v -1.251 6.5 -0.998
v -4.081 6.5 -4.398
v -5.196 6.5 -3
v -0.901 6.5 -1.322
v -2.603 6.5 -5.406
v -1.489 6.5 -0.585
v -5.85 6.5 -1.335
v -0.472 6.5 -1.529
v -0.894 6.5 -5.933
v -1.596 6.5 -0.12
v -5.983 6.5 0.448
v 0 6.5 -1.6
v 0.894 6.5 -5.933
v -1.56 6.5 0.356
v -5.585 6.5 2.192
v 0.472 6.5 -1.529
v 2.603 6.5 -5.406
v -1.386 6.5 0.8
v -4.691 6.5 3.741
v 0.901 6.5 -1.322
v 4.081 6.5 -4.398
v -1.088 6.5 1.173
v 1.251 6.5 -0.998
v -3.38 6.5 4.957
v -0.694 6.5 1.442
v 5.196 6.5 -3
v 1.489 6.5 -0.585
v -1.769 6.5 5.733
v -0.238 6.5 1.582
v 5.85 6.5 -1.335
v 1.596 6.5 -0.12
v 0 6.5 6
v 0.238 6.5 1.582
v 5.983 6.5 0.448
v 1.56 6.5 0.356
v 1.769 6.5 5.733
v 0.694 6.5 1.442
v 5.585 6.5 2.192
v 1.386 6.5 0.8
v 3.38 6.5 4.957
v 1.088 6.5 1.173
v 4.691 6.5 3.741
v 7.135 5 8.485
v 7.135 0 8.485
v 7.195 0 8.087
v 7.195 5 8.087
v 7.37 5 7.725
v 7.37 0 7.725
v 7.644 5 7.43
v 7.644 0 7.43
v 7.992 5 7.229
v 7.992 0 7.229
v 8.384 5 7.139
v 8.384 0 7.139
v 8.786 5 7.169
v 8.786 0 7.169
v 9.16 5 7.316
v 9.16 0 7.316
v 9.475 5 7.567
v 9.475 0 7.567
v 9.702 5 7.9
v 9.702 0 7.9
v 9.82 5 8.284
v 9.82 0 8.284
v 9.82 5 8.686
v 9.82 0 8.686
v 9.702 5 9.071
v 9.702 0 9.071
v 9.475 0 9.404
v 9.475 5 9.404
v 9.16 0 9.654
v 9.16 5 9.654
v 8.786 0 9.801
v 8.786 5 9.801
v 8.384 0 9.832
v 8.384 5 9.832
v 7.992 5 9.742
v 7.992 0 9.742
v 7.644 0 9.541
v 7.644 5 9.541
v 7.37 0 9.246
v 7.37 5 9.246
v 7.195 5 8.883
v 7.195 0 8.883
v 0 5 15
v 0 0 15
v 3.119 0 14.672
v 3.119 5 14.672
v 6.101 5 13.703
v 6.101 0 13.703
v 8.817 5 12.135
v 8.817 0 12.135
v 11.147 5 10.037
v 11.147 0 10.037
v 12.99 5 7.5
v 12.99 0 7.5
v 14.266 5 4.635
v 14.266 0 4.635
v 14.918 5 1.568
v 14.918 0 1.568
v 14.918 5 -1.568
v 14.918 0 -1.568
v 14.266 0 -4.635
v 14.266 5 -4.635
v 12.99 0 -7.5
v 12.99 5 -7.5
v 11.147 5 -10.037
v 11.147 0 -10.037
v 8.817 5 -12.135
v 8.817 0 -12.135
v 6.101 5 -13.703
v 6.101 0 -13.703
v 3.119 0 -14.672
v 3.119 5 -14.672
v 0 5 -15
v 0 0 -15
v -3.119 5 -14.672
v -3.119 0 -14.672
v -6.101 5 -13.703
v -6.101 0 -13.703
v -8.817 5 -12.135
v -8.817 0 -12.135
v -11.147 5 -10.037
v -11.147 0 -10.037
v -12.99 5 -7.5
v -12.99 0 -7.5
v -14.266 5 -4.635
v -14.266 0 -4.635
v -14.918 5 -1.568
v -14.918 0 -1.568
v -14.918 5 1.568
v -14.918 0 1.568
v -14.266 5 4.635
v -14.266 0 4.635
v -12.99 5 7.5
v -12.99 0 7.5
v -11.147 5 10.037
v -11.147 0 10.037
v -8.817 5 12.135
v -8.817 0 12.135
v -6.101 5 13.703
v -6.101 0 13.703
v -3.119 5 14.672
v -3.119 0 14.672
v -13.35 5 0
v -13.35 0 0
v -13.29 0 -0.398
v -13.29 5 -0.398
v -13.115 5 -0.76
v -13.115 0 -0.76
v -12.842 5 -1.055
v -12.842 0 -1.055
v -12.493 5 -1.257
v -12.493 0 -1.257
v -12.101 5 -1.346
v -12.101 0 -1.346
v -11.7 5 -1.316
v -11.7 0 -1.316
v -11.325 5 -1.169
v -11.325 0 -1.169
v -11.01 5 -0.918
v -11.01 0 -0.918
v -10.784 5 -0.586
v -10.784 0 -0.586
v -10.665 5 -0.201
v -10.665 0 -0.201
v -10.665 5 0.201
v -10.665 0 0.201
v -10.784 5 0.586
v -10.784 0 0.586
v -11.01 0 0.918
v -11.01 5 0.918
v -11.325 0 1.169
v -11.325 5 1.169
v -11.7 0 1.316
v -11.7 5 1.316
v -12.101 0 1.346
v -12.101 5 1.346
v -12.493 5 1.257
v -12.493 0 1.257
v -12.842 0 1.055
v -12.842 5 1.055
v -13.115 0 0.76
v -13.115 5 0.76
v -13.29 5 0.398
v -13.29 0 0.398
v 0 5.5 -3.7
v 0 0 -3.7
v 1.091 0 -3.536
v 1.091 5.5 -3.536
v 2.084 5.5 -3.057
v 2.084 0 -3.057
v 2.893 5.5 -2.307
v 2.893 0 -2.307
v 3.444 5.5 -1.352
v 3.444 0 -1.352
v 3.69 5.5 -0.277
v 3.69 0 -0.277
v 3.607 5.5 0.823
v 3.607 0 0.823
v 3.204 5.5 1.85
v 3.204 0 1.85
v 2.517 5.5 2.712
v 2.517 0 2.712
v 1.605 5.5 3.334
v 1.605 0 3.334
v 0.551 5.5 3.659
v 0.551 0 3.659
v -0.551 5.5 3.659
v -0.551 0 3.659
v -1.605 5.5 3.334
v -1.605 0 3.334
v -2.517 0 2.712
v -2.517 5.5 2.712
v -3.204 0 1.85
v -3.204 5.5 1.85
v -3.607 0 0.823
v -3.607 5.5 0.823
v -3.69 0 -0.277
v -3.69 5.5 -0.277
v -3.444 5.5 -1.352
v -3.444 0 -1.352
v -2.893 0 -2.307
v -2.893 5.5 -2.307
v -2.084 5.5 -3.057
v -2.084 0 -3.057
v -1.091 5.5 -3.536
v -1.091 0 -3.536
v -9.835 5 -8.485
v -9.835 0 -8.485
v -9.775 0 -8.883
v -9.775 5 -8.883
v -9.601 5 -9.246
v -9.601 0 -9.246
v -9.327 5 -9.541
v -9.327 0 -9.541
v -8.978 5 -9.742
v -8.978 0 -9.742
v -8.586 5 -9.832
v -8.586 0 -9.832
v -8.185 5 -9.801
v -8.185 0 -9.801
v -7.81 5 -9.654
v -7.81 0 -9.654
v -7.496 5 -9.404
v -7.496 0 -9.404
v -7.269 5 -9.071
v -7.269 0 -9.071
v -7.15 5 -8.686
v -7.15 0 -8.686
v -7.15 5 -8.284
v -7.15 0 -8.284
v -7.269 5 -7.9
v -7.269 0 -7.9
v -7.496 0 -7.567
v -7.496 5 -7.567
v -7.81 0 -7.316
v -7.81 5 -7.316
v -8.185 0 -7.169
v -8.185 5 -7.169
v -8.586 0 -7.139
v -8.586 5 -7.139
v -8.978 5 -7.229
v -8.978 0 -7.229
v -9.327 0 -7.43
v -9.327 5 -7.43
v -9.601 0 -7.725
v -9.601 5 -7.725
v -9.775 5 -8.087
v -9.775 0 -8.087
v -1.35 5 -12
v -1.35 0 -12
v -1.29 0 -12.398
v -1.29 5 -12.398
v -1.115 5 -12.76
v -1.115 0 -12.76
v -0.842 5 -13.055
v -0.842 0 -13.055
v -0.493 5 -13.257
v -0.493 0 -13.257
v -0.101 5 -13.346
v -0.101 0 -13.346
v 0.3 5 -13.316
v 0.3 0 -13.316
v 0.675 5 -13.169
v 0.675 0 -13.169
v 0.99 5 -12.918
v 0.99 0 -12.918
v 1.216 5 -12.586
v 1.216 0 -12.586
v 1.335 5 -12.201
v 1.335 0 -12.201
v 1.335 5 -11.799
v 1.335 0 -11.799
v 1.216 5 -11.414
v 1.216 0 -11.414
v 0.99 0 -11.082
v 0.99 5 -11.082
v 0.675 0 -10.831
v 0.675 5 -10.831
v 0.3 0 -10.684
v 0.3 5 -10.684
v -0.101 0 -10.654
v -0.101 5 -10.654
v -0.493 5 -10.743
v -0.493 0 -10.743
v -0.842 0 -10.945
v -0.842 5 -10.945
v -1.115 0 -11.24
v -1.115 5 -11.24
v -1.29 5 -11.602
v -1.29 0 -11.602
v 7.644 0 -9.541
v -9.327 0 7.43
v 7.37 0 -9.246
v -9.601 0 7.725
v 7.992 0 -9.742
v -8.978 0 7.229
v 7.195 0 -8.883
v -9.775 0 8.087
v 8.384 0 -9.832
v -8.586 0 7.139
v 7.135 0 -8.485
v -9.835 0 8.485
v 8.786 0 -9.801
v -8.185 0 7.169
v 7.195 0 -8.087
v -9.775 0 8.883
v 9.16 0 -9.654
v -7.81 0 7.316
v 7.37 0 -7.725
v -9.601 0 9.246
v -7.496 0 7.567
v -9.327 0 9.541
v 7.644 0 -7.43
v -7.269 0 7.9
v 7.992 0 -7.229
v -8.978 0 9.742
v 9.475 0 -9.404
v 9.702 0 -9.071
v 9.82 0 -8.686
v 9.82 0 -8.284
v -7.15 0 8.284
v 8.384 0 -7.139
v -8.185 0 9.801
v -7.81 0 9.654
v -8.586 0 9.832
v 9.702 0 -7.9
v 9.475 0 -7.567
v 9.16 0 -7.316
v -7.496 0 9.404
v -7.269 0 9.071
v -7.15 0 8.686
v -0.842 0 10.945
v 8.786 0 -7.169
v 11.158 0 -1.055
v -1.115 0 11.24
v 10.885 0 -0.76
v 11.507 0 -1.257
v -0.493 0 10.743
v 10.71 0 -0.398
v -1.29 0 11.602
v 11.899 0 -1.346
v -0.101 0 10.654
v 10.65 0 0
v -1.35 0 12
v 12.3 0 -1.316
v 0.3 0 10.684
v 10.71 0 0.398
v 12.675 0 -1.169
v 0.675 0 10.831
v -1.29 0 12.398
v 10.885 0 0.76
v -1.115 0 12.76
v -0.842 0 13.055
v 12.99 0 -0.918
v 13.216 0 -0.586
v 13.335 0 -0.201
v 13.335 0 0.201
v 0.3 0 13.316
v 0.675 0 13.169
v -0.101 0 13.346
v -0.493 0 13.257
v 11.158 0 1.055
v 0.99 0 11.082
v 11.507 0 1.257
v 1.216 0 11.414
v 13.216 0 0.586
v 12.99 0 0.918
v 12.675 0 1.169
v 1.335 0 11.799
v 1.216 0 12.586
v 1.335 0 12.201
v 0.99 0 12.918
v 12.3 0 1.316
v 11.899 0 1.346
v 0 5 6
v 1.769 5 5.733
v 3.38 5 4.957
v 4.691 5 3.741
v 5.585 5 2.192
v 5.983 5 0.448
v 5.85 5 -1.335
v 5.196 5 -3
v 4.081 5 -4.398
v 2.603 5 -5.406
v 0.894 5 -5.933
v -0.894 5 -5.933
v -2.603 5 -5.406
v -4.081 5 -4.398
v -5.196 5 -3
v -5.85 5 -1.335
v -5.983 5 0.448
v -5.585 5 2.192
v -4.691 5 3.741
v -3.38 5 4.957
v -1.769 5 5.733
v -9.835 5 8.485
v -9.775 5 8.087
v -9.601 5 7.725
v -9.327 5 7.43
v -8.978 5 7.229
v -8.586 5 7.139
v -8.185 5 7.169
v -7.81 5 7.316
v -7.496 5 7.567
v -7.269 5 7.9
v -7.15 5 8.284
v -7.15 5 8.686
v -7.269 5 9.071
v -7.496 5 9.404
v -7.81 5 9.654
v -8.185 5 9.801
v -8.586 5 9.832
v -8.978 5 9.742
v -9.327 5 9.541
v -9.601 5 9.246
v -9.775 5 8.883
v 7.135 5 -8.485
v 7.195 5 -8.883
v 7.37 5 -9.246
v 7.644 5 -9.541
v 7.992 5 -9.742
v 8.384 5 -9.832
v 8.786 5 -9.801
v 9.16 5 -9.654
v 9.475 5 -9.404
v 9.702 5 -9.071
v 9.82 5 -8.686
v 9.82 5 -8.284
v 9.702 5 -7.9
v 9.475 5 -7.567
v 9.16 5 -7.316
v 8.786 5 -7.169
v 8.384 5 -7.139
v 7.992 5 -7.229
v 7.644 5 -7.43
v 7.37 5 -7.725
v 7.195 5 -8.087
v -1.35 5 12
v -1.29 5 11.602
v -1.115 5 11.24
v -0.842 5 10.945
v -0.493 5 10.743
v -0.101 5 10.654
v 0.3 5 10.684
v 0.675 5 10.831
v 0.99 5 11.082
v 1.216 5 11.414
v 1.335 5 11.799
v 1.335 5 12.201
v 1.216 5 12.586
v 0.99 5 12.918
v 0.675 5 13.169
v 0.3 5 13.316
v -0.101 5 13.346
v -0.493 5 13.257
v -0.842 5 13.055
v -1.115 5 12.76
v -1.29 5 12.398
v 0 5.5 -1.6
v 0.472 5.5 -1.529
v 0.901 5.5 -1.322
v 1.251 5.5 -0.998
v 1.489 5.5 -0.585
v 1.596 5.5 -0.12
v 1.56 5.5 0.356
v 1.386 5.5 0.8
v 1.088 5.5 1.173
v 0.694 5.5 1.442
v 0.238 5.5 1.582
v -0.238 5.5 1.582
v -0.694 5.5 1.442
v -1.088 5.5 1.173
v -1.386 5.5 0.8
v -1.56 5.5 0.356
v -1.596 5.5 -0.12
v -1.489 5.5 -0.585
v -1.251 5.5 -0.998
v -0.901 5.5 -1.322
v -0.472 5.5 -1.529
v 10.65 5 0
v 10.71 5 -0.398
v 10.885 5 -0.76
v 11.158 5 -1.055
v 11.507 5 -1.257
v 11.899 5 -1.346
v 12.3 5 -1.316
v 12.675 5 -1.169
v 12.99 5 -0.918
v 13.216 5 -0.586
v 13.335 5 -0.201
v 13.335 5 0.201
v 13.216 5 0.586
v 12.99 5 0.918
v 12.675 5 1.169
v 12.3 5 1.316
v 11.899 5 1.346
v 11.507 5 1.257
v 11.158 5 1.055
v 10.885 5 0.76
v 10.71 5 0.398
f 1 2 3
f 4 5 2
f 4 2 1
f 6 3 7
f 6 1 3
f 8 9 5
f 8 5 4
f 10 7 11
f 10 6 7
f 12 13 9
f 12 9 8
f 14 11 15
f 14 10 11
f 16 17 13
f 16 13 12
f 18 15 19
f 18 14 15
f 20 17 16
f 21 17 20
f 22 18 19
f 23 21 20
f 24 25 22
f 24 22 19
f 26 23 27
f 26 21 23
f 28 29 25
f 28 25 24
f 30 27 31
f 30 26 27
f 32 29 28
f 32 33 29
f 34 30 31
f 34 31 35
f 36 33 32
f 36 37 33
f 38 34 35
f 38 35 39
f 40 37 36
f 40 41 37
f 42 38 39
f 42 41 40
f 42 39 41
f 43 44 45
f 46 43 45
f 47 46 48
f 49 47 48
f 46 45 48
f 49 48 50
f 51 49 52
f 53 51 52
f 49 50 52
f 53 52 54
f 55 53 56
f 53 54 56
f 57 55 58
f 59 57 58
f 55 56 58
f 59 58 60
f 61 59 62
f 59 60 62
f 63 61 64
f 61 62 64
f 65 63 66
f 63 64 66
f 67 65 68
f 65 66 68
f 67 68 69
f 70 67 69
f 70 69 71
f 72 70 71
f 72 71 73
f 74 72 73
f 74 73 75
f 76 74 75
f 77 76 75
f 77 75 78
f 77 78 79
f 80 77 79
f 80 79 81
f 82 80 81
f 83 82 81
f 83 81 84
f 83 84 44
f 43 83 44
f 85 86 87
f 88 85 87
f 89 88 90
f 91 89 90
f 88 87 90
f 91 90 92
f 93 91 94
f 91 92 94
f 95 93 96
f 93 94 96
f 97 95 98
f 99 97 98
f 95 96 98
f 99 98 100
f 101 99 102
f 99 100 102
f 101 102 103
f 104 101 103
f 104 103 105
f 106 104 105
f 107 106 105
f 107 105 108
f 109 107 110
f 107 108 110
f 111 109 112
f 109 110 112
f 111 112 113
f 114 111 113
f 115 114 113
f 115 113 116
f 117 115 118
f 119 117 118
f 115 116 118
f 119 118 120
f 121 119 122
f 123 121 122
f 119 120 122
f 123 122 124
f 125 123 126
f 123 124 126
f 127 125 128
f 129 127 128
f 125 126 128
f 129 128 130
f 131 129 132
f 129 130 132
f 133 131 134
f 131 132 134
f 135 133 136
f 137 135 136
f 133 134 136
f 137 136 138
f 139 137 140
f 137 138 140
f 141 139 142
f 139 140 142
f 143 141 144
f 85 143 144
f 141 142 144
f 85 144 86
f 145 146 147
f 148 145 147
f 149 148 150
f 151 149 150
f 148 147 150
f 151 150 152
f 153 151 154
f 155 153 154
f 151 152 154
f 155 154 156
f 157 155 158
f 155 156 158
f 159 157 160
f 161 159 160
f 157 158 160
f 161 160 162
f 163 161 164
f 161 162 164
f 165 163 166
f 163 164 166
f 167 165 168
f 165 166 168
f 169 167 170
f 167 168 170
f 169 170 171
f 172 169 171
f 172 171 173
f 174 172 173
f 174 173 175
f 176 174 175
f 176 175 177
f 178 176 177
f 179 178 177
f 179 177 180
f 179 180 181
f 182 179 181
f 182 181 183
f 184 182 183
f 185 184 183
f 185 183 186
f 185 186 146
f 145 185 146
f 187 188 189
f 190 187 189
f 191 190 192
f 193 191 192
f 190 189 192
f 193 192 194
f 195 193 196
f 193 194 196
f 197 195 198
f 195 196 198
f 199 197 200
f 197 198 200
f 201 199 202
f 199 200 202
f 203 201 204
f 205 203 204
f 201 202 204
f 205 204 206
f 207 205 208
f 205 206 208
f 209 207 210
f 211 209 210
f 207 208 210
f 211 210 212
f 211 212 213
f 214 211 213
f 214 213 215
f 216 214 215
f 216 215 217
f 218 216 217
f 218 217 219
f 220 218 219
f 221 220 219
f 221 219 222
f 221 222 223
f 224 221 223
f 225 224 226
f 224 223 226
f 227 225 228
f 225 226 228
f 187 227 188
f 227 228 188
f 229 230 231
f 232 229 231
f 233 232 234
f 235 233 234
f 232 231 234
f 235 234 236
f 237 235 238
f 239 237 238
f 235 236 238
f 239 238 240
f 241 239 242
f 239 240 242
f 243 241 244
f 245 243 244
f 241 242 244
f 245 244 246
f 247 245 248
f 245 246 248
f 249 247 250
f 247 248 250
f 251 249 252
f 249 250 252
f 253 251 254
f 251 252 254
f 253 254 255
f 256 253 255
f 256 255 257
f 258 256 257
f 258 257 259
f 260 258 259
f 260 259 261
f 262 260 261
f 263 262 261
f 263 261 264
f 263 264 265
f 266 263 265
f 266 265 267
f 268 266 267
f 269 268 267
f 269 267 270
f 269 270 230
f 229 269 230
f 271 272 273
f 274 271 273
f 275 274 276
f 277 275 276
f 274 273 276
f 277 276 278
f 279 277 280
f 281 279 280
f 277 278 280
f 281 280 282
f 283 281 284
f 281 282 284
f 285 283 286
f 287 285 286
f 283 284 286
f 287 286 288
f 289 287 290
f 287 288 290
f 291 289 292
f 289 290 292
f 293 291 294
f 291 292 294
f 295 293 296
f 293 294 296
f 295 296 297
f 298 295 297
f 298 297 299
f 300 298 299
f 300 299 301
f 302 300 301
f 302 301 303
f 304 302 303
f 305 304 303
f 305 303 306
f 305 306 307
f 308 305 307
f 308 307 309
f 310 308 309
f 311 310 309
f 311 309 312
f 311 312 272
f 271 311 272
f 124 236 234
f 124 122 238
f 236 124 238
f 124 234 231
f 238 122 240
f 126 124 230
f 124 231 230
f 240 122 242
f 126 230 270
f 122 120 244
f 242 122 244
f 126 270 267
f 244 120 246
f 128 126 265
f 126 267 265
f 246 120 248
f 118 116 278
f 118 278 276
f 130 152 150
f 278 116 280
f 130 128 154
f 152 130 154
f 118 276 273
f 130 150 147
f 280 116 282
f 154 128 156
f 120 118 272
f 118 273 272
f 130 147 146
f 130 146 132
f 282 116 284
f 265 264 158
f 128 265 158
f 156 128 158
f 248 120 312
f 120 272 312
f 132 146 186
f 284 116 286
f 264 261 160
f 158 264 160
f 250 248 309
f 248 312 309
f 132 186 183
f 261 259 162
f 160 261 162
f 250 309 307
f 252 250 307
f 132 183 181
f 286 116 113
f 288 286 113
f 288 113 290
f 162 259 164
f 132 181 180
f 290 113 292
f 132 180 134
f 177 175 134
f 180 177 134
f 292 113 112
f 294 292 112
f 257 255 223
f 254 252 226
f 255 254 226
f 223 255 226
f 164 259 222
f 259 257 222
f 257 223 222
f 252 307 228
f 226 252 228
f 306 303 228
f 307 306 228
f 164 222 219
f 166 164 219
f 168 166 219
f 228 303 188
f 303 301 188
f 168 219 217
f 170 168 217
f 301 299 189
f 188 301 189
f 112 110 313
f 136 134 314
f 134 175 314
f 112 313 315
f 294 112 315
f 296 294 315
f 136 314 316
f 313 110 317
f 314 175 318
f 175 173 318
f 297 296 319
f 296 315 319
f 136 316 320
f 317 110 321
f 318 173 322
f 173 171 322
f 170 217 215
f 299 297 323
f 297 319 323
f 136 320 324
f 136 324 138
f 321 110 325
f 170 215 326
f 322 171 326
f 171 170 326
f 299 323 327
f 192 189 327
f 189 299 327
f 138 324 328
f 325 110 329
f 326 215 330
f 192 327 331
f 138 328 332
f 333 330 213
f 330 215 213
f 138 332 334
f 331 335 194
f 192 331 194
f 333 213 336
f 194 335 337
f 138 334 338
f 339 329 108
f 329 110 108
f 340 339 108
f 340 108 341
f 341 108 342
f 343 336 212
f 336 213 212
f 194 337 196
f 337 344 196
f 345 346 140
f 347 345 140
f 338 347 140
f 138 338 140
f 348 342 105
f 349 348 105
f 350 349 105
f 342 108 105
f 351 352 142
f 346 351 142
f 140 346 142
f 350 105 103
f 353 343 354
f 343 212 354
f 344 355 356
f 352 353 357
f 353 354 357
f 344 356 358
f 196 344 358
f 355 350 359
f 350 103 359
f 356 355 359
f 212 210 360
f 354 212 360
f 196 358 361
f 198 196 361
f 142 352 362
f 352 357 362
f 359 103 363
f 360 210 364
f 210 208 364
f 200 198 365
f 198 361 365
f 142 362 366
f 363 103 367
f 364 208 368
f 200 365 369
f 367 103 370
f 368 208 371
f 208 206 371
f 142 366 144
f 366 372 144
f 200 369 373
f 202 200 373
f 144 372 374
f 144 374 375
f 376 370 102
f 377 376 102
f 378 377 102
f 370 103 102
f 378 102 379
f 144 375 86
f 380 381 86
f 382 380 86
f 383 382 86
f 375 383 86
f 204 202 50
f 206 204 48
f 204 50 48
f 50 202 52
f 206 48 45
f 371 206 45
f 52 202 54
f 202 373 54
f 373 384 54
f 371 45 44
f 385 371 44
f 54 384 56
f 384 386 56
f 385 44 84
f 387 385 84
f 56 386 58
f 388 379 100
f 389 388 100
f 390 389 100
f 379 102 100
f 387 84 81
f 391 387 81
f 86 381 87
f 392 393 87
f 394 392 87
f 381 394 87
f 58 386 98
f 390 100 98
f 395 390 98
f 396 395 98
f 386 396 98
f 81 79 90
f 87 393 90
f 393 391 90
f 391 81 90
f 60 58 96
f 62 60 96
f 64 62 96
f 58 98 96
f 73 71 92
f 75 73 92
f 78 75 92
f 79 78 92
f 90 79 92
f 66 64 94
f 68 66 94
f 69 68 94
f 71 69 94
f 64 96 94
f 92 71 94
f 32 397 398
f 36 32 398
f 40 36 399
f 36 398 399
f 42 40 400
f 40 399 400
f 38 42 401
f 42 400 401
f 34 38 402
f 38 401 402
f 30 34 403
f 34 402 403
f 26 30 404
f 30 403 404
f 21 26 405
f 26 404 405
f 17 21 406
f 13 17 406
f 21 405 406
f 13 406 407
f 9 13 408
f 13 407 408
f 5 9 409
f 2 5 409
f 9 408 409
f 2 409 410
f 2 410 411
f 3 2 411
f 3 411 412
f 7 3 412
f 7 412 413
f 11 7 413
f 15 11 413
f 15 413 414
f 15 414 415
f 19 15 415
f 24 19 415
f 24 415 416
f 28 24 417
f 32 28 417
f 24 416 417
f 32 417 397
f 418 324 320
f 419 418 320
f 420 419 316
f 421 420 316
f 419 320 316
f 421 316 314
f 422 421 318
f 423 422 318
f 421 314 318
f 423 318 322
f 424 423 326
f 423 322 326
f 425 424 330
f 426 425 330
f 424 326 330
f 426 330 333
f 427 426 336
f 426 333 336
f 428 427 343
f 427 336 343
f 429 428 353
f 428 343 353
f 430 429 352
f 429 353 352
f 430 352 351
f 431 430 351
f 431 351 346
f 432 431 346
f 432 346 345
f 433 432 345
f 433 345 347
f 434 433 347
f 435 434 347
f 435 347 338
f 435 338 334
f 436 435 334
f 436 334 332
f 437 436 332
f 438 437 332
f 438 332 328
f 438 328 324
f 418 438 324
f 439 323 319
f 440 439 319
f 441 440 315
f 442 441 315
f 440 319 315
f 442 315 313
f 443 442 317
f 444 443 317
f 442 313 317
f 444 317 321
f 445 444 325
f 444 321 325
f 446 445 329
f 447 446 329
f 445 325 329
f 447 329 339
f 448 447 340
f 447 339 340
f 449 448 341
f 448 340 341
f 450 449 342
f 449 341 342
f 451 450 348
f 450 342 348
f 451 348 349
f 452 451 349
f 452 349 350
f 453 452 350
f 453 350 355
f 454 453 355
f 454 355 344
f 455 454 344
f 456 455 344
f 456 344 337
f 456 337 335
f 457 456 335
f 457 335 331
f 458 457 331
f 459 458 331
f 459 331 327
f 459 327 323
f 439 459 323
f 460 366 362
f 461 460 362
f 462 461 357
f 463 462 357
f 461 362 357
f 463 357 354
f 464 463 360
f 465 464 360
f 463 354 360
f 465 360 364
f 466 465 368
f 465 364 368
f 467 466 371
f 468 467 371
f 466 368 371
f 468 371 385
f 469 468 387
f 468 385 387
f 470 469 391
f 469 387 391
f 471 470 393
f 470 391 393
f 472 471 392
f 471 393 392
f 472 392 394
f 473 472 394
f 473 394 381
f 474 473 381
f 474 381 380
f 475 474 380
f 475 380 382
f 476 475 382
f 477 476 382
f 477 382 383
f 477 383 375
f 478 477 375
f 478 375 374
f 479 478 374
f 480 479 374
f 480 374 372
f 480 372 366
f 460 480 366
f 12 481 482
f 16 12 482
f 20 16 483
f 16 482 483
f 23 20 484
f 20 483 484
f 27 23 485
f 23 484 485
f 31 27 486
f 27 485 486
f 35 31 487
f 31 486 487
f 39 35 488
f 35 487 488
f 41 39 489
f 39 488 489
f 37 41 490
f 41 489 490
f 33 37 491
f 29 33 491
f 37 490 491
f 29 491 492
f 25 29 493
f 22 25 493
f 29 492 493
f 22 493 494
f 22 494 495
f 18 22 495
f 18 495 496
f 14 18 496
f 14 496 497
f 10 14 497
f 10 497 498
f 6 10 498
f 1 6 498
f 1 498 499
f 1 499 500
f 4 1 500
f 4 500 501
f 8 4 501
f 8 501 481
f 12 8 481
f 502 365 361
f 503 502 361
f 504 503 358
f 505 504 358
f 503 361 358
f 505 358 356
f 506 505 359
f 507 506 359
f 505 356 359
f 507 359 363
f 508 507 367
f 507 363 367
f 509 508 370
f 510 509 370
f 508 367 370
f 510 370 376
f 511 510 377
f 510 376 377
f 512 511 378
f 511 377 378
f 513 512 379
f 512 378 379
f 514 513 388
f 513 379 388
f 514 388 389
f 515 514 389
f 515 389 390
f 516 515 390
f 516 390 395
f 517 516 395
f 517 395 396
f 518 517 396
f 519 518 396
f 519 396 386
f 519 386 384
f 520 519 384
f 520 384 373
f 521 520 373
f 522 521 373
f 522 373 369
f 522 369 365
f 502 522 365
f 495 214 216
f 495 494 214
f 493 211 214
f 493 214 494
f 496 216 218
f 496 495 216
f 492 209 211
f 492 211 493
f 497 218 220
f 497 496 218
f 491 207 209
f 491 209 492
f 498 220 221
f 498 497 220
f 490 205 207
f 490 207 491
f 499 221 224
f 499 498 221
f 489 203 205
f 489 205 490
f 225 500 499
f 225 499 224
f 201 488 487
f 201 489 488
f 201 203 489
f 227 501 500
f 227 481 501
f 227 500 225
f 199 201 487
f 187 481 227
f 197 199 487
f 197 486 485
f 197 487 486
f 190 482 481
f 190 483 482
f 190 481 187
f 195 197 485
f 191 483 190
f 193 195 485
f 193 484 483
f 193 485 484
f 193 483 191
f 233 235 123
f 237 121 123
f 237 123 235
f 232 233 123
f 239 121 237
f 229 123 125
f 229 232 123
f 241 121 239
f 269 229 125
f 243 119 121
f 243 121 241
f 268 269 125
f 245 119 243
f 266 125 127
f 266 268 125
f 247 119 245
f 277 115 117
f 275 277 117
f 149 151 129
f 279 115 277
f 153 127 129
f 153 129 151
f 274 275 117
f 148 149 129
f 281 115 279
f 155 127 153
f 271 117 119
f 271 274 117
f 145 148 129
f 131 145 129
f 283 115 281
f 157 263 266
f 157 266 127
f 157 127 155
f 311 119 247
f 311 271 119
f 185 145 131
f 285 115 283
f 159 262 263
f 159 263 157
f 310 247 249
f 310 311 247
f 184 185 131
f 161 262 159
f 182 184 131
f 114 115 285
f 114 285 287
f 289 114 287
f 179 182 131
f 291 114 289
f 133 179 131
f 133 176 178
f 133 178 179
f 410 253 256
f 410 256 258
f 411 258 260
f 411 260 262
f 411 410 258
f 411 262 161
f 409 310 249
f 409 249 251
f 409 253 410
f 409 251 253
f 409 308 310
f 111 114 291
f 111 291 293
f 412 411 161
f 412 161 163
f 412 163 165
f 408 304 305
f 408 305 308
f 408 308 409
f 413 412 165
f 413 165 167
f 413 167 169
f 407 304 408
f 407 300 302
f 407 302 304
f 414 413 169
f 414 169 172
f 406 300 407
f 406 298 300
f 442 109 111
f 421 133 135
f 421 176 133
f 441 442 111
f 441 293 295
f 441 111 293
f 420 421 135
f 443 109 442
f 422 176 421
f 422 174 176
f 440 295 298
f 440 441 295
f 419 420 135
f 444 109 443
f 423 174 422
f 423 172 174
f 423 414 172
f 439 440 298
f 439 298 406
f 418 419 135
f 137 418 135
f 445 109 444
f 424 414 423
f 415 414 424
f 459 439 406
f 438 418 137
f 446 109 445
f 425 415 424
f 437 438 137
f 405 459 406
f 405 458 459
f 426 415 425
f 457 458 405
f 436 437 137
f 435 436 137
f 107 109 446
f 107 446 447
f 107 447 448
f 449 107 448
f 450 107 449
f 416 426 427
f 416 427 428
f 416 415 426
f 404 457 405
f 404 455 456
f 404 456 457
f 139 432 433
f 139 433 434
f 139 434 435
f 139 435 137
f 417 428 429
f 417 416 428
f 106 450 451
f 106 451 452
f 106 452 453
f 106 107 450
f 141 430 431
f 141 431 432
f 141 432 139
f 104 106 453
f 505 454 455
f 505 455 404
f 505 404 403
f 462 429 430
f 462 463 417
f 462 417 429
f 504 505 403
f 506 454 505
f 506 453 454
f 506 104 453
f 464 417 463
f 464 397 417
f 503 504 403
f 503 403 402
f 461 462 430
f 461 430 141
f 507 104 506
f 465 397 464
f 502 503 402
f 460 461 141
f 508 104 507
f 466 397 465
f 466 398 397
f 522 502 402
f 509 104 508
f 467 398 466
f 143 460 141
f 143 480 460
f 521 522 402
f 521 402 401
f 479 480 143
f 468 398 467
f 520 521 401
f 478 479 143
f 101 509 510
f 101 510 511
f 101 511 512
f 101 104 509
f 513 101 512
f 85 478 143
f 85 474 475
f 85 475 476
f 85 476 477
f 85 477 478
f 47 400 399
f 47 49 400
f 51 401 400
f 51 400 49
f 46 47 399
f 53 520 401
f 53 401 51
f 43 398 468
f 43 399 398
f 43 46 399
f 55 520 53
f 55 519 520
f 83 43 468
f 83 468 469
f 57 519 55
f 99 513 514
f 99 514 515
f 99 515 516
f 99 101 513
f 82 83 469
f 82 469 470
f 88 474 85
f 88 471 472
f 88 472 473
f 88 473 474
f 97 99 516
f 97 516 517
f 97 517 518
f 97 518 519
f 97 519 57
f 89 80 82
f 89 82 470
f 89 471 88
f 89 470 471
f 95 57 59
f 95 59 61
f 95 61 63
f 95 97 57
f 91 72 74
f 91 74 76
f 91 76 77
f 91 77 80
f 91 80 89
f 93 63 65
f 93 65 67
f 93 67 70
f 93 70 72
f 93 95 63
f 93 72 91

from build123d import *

# Parameters (mm, degrees)
ESQUISSE1_R             = 15
BOSS_EXTRU_1_DEPTH      = 5
ESQUISSE2_R             = 6
BOSS_EXTRU_2_DEPTH      = 1.5
ESQUISSE3_R             = 1.6
ENL_V_MAT_EXTRU_1_DEPTH = 23.186707732
ESQUISSE4_R             = 3.7
ENL_V_MAT_EXTRU_2_DEPTH = 5.5
D_GAGEMENT_M2_51_D      = 2.7


with BuildPart() as part:
    # Esquisse1 → Boss.-Extru.1 (new body)
    with BuildSketch(Plane(origin=(0, 0, 0), x_dir=(1, 0, 0), z_dir=(0, 1, 0))):
        with Locations(Location((0, 0, 0), (0, 0, 270))):
            Circle(ESQUISSE1_R)
    extrude(amount=BOSS_EXTRU_1_DEPTH)

    # Esquisse2 → Boss.-Extru.2 (add)
    with BuildSketch(Plane(origin=(0, 5, 0), x_dir=(1, 0, 0), z_dir=(0, 1, 0))):
        with Locations(Location((0, 0, 0), (0, 0, 270))):
            Circle(ESQUISSE2_R)
    extrude(amount=BOSS_EXTRU_2_DEPTH)

    # Esquisse3 → Enlèv. mat.-Extru.1 (cut, through all)
    with BuildSketch(Plane.XZ):
        with Locations(Location((0, 0, 0), (0, 0, 270))):
            Circle(ESQUISSE3_R)
    extrude(amount=-ENL_V_MAT_EXTRU_1_DEPTH, mode=Mode.SUBTRACT)

    # Esquisse4 → Enlèv. mat.-Extru.2 (cut)
    with BuildSketch(Plane.XZ):
        with Locations(Location((0, 0, 0), (0, 0, 270))):
            Circle(ESQUISSE4_R)
    extrude(amount=-ENL_V_MAT_EXTRU_2_DEPTH, mode=Mode.SUBTRACT)

    # Dégagement M2.51 (through all)
    with Locations(Plane(origin=(0, 5, 0), x_dir=(1, 0, 0), z_dir=(0, 1, 0))):
        with Locations((0, 0), (-12, 0), (-8.485281374, 8.485281374), (0, 12), (8.485281374, 8.485281374), (12, 0), (8.485281374, -8.485281374), (0, -12), (-8.485281374, -8.485281374)):
            Hole(D_GAGEMENT_M2_51_D / 2)


solid = part.part
